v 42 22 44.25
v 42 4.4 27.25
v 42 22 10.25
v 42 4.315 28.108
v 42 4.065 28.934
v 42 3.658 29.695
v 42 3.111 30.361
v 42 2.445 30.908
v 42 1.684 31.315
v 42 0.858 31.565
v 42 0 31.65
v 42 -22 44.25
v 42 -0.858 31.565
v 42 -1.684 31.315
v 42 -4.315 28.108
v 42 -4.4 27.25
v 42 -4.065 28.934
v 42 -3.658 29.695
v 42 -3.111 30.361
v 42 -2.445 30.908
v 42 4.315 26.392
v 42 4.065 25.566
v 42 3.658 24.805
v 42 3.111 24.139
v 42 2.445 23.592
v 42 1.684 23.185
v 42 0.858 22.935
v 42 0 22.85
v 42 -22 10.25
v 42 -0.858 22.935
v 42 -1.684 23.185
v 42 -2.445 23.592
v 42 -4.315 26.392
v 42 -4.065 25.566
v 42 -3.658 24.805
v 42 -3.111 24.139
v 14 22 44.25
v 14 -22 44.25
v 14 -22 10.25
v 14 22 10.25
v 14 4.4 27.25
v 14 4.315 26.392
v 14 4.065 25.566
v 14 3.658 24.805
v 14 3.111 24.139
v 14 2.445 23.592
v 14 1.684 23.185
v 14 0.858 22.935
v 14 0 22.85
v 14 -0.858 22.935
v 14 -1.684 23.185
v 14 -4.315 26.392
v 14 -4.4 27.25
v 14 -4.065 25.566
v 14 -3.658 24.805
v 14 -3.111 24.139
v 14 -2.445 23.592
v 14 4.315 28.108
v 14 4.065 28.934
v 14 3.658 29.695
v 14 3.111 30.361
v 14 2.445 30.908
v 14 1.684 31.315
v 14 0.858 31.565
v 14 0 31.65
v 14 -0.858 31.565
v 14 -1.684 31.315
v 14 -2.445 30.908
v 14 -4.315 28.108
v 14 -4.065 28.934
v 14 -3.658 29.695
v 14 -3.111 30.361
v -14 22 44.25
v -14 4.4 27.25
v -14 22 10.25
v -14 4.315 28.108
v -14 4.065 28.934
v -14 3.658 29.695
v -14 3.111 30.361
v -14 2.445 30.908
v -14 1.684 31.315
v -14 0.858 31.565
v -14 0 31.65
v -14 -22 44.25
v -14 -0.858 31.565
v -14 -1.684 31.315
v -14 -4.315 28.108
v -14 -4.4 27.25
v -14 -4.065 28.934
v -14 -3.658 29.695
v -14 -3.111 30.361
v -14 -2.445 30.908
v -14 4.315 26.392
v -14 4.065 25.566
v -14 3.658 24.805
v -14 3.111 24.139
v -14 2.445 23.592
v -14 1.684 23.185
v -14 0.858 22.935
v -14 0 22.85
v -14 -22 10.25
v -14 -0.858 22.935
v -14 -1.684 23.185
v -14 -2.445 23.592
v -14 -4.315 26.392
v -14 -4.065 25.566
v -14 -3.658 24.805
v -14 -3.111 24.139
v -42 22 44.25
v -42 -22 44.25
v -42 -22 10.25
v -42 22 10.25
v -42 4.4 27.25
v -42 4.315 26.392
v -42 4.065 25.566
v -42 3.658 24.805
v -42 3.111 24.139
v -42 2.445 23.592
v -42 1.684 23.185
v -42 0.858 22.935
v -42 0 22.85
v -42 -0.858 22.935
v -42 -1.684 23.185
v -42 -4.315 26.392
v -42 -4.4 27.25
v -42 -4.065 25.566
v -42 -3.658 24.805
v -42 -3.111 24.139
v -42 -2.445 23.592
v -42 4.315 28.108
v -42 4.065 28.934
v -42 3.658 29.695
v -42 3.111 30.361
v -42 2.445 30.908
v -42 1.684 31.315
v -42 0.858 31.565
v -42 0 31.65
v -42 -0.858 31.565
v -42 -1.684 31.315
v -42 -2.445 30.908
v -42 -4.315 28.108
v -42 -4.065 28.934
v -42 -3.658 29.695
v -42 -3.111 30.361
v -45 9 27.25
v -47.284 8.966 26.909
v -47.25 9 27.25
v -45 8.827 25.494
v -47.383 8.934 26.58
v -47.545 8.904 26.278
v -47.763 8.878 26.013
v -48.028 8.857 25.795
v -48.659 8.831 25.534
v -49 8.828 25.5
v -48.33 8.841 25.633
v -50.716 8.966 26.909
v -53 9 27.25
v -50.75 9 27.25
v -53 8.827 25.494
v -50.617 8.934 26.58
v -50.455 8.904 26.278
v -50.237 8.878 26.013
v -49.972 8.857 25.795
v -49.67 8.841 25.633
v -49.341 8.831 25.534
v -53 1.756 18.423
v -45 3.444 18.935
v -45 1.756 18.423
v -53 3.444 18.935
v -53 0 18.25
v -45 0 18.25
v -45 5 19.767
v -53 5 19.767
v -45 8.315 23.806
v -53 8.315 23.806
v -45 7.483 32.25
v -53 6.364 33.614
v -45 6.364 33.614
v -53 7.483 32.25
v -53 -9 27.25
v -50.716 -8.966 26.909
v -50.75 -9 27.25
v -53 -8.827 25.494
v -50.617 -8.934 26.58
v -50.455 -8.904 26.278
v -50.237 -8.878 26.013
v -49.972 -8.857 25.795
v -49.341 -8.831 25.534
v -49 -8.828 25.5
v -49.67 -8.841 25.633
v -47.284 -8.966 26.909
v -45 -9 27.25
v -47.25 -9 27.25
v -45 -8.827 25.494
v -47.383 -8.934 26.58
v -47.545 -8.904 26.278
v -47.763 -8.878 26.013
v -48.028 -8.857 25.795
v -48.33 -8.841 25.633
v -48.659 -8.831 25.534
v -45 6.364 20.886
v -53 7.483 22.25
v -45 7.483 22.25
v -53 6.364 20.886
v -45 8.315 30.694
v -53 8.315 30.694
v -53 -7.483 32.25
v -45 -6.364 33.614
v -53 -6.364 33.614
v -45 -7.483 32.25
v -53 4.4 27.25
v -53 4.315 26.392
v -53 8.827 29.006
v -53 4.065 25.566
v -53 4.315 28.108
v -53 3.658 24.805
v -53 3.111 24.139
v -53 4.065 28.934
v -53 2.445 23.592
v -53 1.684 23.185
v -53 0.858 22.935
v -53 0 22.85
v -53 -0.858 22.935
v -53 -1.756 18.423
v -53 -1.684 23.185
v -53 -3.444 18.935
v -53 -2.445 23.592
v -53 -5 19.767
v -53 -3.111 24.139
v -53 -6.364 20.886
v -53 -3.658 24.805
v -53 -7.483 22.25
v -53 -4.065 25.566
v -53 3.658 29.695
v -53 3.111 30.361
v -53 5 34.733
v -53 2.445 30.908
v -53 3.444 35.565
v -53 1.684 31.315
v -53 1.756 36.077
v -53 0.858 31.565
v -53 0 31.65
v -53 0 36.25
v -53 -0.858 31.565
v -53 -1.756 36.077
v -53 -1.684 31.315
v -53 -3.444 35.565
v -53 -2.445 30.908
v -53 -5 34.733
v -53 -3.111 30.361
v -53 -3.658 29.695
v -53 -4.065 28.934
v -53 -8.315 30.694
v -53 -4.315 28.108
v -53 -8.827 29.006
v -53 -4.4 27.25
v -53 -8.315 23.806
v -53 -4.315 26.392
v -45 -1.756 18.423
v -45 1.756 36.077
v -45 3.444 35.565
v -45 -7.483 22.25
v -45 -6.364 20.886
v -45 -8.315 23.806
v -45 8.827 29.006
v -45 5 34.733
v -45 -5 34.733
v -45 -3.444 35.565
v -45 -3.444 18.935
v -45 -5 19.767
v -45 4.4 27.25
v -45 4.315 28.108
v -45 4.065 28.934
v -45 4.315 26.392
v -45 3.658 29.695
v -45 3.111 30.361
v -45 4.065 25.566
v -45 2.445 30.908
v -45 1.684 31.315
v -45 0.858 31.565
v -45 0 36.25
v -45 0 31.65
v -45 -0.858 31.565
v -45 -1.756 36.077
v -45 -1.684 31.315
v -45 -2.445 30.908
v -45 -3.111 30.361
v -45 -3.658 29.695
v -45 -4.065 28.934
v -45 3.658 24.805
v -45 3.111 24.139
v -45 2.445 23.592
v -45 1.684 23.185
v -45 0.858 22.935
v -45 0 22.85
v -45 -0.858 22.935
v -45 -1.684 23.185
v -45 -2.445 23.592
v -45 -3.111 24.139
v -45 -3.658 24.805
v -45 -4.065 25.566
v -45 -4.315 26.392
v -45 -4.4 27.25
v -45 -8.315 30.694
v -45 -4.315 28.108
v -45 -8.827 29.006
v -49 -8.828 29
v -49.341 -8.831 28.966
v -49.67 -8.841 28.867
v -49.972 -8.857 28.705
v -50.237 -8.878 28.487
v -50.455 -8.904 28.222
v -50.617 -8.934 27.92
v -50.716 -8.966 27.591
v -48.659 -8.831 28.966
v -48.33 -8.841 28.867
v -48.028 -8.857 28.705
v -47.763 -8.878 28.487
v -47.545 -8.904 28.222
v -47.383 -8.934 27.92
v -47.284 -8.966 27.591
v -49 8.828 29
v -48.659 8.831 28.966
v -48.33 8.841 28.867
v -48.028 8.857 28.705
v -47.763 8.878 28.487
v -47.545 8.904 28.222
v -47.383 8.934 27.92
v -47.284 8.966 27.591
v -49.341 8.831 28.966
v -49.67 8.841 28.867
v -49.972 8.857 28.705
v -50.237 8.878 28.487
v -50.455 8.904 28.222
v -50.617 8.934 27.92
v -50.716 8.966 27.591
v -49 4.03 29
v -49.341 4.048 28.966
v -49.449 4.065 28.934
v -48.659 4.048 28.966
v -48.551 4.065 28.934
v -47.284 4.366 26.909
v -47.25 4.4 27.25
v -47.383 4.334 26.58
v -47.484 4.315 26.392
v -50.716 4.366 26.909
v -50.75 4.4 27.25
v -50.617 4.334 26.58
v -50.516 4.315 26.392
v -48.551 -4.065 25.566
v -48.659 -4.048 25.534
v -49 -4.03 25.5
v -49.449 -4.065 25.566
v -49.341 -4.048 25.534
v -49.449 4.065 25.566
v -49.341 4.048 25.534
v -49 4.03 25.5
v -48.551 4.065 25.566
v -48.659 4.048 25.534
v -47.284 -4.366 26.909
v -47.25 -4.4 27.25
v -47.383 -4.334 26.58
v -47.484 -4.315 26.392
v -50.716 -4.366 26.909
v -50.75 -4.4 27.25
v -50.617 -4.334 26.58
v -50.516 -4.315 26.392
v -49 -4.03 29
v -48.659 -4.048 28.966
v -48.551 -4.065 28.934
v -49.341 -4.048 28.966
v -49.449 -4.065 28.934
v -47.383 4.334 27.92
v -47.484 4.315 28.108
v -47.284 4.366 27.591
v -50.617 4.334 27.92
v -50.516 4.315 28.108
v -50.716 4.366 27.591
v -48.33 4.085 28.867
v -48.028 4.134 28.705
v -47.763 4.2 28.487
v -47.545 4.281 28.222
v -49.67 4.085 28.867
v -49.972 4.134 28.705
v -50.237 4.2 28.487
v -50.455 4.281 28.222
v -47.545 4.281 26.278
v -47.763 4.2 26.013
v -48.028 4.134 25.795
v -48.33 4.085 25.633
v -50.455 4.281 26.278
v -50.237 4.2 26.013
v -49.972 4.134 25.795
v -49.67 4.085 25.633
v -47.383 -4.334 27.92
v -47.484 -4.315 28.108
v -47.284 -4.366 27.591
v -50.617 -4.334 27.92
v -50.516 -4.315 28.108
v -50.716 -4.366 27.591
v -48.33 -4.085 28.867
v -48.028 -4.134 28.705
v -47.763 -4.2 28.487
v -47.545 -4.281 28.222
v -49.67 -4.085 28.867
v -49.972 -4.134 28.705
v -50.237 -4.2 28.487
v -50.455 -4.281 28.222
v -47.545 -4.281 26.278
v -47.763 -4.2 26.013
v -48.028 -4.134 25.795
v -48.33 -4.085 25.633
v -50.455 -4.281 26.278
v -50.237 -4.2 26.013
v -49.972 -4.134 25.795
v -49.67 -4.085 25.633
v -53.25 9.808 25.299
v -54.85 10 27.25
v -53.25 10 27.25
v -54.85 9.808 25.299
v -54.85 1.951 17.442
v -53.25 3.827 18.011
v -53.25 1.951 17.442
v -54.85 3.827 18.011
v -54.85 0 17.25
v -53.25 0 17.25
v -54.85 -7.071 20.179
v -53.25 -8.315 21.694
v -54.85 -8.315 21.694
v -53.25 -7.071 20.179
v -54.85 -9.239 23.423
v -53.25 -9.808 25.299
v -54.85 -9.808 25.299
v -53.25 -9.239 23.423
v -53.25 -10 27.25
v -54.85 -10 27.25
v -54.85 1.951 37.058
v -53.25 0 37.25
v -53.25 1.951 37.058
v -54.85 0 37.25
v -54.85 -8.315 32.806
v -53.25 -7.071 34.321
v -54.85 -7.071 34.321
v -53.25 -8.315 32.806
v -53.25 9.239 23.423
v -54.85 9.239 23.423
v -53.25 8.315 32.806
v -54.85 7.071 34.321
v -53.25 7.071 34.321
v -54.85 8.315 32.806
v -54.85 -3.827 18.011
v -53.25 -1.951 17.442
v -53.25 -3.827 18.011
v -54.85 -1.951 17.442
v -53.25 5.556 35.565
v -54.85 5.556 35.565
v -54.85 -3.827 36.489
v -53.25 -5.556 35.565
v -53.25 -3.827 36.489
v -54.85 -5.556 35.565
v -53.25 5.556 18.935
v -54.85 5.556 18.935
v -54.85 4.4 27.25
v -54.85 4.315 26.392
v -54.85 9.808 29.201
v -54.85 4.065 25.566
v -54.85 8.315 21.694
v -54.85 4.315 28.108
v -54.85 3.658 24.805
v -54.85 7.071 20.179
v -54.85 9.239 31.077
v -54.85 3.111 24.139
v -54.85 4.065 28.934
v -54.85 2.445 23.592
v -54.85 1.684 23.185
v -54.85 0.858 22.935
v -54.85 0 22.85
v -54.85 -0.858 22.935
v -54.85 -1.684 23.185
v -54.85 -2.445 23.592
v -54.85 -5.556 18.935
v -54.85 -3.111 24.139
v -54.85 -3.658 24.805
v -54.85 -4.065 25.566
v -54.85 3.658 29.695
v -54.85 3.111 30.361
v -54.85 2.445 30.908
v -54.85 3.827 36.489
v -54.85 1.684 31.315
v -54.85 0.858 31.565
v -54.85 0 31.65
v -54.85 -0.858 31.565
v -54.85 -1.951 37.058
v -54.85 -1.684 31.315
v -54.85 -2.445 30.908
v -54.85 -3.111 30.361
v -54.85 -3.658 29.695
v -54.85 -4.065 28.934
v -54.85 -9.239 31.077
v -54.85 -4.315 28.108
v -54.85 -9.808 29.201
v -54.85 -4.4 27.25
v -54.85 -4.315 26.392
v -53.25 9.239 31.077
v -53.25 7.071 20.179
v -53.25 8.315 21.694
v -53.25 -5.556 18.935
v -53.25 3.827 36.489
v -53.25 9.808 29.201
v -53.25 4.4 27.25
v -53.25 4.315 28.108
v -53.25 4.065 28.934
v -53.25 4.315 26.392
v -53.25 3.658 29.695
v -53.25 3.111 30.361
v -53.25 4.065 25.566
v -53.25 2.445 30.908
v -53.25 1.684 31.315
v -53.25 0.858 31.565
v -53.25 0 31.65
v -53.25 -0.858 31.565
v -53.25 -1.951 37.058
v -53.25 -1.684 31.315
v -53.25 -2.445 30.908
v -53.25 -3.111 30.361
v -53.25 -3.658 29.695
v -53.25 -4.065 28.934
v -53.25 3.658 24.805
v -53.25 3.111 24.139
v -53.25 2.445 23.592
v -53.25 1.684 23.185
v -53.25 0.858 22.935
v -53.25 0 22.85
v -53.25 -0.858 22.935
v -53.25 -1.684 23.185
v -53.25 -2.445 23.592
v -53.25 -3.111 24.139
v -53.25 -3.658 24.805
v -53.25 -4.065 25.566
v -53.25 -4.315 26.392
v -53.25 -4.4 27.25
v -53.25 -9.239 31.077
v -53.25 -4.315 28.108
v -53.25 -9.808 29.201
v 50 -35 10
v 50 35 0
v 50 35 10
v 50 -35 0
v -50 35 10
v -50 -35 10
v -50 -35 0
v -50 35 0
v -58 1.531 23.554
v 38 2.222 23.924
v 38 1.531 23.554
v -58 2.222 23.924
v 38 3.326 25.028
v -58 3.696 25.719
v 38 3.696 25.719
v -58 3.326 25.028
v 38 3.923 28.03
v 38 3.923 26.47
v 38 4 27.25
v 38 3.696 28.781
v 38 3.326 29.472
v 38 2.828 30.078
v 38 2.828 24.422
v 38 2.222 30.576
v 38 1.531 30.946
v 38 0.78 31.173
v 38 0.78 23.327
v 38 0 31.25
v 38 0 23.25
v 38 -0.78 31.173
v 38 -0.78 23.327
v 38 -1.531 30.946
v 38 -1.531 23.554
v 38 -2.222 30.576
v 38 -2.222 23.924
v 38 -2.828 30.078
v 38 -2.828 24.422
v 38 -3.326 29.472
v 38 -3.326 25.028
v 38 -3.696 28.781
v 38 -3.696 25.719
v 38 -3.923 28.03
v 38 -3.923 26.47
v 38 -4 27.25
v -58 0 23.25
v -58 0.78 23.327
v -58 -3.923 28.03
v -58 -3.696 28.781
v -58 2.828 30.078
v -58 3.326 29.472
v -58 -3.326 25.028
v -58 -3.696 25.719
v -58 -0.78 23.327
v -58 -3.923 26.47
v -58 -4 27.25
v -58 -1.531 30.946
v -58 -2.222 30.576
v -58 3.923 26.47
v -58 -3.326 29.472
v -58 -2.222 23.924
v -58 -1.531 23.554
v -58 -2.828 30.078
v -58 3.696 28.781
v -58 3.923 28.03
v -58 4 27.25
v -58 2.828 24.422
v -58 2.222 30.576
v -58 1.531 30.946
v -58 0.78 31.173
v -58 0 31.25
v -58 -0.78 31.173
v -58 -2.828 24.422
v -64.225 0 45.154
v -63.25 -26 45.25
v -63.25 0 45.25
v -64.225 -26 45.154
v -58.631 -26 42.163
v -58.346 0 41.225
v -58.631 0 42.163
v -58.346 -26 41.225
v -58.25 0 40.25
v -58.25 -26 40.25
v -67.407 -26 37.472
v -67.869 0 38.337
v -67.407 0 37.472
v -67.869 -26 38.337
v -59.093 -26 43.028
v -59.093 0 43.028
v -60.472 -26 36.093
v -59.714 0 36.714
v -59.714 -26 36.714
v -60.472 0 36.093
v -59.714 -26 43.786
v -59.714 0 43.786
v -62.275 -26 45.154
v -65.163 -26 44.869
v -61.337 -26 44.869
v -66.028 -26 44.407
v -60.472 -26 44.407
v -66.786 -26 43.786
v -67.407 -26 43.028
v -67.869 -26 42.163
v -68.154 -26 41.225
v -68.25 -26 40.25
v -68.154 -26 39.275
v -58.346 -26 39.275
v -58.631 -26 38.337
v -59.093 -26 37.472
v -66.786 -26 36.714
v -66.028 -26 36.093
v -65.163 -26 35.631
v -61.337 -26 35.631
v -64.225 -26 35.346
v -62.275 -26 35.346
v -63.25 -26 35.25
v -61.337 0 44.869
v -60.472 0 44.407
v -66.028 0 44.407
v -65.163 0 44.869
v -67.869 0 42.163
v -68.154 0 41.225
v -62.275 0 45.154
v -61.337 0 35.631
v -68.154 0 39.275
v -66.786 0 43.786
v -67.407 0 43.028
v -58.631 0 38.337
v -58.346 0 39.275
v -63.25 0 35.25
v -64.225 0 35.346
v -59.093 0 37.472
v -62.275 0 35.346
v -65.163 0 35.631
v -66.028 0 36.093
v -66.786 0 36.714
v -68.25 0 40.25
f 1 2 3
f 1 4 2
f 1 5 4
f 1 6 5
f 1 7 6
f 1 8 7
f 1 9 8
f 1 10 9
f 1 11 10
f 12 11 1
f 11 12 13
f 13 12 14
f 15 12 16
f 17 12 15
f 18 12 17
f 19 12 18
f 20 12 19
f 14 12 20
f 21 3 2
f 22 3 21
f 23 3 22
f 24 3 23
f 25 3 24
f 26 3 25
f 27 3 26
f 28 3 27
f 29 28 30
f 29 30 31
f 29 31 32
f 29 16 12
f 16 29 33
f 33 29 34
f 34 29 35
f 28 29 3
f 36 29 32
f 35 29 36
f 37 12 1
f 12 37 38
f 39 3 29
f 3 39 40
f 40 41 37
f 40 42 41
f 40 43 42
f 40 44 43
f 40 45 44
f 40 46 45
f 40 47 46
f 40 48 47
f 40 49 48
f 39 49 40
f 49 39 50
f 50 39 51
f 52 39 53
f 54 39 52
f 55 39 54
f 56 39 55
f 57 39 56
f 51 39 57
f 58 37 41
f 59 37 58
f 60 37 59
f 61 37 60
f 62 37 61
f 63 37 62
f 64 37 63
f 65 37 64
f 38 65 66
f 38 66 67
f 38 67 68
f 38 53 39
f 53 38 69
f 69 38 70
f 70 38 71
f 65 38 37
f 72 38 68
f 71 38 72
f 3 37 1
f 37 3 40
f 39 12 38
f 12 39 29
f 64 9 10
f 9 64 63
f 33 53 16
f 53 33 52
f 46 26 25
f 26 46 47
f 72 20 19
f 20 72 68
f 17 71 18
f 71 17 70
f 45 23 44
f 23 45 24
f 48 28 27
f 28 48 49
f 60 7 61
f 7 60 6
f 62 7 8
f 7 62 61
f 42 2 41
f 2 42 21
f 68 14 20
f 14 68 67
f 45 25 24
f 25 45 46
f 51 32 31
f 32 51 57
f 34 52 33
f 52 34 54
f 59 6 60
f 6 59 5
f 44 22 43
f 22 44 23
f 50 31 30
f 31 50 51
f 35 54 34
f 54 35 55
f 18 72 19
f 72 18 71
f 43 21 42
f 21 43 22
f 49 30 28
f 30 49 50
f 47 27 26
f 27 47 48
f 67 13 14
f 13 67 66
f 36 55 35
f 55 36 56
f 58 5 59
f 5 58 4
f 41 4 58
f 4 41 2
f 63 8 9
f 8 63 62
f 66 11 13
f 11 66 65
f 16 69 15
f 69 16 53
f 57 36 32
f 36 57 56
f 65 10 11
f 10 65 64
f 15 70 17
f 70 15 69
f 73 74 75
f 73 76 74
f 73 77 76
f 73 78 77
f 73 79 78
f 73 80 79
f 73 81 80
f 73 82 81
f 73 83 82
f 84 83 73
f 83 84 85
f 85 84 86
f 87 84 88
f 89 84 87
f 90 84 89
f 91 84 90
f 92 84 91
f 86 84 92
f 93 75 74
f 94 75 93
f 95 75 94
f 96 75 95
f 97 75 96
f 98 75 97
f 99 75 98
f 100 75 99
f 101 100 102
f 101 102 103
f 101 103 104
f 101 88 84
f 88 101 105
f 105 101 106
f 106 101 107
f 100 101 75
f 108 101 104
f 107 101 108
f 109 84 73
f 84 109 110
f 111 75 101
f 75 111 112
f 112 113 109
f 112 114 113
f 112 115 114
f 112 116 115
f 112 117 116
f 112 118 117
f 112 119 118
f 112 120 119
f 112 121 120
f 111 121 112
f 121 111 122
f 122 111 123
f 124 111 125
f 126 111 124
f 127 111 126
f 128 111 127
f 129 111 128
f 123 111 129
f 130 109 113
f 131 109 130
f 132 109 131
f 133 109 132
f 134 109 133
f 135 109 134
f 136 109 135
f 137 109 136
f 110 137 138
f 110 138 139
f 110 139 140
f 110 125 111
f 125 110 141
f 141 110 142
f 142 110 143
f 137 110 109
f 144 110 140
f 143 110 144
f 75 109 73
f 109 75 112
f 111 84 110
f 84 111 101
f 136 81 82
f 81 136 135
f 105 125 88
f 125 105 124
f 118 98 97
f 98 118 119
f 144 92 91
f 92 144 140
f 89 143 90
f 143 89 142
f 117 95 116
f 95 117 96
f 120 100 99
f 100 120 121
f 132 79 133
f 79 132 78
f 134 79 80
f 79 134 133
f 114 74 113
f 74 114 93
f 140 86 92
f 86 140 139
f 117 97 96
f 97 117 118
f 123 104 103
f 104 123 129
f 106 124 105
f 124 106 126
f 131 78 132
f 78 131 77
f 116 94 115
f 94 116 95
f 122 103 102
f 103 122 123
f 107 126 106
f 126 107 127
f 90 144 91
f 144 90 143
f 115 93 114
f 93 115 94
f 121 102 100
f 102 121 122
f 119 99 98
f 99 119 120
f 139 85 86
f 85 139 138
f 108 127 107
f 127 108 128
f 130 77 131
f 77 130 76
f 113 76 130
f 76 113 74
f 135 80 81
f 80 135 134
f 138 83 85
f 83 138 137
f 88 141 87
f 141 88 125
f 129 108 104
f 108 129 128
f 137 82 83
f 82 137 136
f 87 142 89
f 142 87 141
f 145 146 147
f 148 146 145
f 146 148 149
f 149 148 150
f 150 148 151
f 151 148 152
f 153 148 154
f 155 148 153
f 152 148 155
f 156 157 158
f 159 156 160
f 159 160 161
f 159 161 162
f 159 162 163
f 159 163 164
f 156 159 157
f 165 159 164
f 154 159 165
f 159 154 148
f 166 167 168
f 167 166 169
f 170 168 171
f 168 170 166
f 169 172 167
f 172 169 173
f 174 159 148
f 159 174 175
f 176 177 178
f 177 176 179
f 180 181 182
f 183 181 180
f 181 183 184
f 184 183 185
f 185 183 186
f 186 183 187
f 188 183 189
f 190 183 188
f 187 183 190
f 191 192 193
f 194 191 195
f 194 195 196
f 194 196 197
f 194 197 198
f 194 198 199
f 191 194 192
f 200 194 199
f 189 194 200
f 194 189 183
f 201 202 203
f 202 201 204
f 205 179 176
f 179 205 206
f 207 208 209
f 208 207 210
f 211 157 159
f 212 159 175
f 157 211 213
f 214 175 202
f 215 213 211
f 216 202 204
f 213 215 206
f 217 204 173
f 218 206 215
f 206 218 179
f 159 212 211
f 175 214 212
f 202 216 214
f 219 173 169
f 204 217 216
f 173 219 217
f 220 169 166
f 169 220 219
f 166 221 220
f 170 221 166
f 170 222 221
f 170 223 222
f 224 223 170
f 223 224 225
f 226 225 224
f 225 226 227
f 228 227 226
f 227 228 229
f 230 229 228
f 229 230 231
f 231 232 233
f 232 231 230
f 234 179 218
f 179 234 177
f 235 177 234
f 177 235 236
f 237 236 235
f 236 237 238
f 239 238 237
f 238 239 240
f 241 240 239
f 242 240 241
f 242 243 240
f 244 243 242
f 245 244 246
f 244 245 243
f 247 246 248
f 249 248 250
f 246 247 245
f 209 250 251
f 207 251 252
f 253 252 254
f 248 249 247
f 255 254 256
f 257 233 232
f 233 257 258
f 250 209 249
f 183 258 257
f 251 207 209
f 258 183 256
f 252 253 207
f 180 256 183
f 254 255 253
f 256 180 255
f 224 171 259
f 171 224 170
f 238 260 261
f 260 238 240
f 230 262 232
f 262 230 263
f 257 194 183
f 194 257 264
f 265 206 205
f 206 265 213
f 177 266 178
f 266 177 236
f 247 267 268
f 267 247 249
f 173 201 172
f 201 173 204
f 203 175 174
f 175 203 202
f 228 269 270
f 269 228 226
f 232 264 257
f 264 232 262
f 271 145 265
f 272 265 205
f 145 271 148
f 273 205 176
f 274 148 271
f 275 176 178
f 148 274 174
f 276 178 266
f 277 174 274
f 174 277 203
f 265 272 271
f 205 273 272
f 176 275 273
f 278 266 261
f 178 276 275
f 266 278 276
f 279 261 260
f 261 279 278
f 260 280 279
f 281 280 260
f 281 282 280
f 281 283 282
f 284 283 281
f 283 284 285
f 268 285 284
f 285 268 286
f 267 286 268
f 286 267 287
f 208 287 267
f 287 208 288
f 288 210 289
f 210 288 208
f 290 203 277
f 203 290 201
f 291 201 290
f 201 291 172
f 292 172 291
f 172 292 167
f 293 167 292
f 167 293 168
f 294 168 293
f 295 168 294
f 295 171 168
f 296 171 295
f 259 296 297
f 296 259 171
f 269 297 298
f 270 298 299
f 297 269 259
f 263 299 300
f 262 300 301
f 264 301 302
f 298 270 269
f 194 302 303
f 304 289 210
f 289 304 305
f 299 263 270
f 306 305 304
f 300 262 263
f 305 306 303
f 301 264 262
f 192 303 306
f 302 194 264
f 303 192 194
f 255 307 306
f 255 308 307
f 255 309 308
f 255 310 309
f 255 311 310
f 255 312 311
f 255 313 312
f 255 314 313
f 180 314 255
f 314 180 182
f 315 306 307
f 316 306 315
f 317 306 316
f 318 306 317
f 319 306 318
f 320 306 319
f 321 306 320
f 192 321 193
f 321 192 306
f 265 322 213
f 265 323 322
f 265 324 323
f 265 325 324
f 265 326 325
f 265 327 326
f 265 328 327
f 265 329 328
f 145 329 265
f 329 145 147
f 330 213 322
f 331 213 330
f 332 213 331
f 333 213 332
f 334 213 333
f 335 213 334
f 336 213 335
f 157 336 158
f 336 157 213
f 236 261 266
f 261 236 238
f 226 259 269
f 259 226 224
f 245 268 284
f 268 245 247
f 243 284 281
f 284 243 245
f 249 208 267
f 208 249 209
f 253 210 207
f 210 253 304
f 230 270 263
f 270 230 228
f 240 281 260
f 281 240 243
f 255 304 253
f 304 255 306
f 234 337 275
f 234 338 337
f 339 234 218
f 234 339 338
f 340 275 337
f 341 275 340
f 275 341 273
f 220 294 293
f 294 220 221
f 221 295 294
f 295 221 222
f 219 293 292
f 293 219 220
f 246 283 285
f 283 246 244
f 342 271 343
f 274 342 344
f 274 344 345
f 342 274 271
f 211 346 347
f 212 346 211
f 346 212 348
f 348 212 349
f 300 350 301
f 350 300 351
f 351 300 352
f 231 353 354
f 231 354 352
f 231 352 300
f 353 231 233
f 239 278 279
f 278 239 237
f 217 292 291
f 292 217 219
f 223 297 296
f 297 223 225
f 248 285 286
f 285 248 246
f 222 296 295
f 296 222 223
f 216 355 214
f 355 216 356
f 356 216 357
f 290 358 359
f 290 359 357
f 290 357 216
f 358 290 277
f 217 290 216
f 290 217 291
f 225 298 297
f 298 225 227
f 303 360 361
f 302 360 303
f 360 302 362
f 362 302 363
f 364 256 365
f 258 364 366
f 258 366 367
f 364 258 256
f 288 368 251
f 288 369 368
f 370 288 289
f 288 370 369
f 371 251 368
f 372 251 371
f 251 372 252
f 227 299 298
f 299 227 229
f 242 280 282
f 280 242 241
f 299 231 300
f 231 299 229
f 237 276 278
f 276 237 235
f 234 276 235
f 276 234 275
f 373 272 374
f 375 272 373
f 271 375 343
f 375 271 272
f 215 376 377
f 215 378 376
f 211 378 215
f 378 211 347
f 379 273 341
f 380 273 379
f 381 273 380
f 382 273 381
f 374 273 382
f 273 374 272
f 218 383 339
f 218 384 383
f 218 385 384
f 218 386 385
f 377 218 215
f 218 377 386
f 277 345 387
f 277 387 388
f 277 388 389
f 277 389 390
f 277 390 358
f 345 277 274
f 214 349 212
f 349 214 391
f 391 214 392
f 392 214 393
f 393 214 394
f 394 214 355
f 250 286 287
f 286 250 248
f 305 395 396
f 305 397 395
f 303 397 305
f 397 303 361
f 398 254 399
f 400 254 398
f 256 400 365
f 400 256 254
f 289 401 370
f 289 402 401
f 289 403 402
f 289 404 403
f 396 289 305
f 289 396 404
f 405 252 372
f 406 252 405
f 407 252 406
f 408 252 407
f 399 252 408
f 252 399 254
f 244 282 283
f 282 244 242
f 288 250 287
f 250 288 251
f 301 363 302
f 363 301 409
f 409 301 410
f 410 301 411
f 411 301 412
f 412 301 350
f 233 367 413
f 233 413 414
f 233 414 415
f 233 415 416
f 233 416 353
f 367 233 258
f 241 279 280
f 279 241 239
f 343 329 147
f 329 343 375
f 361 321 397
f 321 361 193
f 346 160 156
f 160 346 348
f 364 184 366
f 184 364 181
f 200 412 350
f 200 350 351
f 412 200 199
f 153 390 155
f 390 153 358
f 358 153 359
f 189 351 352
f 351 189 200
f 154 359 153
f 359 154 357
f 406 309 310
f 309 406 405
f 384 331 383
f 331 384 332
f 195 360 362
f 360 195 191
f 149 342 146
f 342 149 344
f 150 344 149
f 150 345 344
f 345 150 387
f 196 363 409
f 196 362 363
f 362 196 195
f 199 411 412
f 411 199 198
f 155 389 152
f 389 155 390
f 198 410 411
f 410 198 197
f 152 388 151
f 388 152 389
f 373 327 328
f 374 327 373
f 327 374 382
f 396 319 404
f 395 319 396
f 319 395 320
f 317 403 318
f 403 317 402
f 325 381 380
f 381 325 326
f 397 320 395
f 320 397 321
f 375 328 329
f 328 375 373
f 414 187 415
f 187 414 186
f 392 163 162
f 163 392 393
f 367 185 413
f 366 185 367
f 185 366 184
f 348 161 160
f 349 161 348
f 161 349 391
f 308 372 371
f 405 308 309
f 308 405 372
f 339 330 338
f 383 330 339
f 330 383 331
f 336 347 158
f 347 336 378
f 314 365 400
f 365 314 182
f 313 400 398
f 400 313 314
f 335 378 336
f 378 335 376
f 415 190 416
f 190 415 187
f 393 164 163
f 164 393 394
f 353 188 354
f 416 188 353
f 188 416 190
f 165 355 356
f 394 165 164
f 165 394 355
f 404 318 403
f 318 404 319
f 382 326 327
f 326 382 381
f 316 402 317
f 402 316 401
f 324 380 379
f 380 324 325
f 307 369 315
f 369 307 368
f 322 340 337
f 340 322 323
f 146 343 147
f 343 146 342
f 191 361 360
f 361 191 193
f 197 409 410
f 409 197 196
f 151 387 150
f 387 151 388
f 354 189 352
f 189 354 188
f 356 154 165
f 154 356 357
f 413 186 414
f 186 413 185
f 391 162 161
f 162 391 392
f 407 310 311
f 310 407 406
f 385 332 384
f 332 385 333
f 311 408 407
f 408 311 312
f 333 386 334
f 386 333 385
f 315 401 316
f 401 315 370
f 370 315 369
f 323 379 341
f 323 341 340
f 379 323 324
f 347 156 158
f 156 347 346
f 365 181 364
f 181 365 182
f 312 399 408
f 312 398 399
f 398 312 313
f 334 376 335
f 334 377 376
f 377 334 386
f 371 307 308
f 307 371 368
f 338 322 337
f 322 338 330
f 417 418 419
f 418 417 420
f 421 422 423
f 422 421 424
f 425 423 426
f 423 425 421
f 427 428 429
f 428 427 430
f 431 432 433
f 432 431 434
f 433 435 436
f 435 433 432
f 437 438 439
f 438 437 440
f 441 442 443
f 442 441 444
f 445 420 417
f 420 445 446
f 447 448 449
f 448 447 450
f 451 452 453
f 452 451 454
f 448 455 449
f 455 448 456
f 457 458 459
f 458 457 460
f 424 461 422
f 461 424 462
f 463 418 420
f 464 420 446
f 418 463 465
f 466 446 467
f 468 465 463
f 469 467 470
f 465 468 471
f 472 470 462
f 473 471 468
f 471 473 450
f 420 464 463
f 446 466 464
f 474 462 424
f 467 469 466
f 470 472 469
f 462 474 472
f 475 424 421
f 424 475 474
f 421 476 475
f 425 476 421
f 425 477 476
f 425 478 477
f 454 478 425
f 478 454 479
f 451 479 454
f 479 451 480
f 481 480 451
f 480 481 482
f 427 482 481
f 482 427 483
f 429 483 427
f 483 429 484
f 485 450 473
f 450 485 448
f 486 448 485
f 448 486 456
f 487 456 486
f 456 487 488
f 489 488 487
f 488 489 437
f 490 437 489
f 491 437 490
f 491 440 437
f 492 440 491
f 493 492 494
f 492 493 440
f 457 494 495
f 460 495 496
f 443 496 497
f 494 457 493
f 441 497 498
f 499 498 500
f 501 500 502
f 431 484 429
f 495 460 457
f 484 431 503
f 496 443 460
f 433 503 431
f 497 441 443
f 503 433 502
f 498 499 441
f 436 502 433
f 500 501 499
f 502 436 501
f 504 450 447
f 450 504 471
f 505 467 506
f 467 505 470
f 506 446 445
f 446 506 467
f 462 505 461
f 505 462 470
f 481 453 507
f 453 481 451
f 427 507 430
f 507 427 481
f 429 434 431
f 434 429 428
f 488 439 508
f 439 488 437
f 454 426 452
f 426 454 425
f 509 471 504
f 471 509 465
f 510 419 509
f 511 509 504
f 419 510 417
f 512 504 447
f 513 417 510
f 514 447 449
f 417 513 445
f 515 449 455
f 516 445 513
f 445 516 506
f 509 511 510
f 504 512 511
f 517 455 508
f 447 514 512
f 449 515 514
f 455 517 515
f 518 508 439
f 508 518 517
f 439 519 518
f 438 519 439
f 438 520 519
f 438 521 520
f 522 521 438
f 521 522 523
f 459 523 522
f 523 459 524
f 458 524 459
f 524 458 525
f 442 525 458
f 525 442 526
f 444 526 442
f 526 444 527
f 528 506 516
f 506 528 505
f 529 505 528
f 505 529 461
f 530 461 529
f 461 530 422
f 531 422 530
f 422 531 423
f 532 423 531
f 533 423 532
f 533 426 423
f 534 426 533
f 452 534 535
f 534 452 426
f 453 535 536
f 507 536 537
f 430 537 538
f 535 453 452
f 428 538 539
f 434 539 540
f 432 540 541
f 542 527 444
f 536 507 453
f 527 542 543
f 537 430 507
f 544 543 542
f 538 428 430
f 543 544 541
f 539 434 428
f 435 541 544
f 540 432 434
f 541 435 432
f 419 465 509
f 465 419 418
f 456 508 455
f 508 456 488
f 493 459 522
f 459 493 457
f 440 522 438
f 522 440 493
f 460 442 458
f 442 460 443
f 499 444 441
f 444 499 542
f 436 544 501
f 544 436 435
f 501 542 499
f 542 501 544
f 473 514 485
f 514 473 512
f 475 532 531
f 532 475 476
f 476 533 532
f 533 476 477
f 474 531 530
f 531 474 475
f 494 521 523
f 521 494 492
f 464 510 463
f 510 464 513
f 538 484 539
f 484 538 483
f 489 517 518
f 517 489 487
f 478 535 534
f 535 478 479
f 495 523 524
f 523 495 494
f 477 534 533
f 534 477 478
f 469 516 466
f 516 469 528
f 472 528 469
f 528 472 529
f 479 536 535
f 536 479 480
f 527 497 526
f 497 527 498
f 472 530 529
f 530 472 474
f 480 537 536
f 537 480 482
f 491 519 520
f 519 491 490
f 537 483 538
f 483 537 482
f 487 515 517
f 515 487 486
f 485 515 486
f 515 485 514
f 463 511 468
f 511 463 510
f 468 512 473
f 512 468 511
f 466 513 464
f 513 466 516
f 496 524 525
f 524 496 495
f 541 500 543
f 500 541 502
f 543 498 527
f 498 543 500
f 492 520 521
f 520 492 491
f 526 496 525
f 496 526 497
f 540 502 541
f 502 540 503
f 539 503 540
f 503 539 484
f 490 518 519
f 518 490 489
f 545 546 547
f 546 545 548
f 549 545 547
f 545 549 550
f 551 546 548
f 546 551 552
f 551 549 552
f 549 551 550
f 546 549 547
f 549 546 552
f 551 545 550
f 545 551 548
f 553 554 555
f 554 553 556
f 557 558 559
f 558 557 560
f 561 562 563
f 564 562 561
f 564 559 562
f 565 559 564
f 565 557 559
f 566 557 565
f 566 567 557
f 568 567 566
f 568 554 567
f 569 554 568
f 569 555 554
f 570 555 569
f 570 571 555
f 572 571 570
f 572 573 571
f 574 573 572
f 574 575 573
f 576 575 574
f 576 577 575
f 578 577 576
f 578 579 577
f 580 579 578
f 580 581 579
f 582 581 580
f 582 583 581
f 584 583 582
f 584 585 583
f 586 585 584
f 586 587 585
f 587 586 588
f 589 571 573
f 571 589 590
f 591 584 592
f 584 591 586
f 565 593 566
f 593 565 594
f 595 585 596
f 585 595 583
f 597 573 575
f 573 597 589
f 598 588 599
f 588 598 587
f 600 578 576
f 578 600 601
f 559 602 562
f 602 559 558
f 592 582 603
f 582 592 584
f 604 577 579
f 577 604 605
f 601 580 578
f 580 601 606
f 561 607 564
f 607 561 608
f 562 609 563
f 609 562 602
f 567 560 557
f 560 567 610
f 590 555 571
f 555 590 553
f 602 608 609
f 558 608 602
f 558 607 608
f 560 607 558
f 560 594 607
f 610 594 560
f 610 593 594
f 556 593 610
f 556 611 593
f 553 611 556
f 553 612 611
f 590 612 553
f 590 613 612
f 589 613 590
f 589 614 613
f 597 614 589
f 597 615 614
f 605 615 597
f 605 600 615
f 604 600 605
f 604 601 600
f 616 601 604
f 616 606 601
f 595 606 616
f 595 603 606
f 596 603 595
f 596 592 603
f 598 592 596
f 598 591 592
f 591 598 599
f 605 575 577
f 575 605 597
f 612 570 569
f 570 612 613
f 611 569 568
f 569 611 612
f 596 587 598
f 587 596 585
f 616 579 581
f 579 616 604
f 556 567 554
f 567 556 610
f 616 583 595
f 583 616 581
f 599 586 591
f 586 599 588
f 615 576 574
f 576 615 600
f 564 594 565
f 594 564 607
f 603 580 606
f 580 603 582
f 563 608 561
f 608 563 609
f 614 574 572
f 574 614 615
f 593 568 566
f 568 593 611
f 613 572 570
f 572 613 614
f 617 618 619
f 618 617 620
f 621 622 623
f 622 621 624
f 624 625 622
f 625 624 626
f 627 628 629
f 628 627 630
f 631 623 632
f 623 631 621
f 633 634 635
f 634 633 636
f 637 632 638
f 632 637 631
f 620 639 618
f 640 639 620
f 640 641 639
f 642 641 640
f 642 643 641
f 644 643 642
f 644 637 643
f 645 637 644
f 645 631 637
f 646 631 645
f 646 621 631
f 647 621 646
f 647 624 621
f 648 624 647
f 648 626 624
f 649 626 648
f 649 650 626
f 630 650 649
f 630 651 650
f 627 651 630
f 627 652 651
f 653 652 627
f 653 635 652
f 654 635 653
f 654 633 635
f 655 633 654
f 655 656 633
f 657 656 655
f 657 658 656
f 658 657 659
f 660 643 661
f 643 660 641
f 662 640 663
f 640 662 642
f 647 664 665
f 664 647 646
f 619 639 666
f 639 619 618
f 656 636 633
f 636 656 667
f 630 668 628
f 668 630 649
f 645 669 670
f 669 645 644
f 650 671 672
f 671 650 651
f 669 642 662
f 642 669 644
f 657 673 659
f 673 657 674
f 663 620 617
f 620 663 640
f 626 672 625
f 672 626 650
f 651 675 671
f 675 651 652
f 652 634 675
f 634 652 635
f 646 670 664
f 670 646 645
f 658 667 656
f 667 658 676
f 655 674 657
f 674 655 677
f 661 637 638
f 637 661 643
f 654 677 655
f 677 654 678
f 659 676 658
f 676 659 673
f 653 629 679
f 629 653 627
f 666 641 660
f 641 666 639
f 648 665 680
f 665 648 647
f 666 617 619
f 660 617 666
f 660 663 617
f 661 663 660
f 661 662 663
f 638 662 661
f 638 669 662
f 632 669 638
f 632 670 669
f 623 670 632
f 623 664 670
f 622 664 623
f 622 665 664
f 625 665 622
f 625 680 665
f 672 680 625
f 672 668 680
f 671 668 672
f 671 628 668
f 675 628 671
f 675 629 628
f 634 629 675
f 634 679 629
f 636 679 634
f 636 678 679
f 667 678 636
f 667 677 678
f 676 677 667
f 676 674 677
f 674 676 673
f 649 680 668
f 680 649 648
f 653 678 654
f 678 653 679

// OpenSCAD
$fn = 32;

// ------------------------------------------------------------------------
// Machine vise: screw d8, jaws 28 x 34 mm
// Every part is its own module, assembly() places every instance.
// ------------------------------------------------------------------------

// --- part 1 ---
module vise_bed() {
  difference() {
    translate([-50, -35, 0]) cube([100, 70, 10]);
  }
}

// --- part 2 ---
module vise_jaw() {
  difference() {
    translate([-14, -22, 0]) cube([28, 44, 34]);
    translate([0, 0, 17]) rotate([0, 90, 0]) cylinder(h = 30, d = 8.8, center = true);
  }
}

// --- part 3 ---
module vise_screw() {
  translate([0, 0, -48]) cylinder(h = 96, d = 8);
}

// --- part 4 ---
module screw_collar() {
  difference() {
    cylinder(h = 8, d = 18);
    translate([0, 0, -1]) cylinder(h = 10, d = 8.8);
    translate([0, 0, 4]) rotate([90, 0, 0]) cylinder(h = 20, d = 3.5, center = true);
  }
}

// --- part 5 ---
module screw_washer() {
  difference() {
      translate([0, 0, 0]) cylinder(h = 1.6, d = 20);
      translate([0, 0, -1]) cylinder(h = 3.6, d = 8.8);
    }
}

// --- part 6 ---
module vise_handle() {
  cylinder(h = 26, d = 10);
}

// --- assembly ---
module assembly() {
  color([0.80, 0.24, 0.20]) translate([0, 0, 0]) rotate([0, 0, 0]) vise_bed();
  color([0.20, 0.45, 0.75]) translate([28, 0, 10.25]) rotate([0, 0, 0]) vise_jaw();
  color([0.25, 0.62, 0.32]) translate([-28, 0, 10.25]) rotate([0, 0, 0]) vise_jaw();
  color([0.92, 0.70, 0.18]) translate([-10, 0, 27.25]) rotate([0, 90, 0]) vise_screw();
  color([0.58, 0.35, 0.70]) translate([-53, 0, 27.25]) rotate([0, 90, 0]) screw_collar();
  color([0.16, 0.66, 0.66]) translate([-54.85, 0, 27.25]) rotate([0, 90, 0]) screw_washer();
  color([0.85, 0.48, 0.18]) translate([-63.25, 0, 40.25]) rotate([90, 0, 0]) vise_handle();
}

assembly();
